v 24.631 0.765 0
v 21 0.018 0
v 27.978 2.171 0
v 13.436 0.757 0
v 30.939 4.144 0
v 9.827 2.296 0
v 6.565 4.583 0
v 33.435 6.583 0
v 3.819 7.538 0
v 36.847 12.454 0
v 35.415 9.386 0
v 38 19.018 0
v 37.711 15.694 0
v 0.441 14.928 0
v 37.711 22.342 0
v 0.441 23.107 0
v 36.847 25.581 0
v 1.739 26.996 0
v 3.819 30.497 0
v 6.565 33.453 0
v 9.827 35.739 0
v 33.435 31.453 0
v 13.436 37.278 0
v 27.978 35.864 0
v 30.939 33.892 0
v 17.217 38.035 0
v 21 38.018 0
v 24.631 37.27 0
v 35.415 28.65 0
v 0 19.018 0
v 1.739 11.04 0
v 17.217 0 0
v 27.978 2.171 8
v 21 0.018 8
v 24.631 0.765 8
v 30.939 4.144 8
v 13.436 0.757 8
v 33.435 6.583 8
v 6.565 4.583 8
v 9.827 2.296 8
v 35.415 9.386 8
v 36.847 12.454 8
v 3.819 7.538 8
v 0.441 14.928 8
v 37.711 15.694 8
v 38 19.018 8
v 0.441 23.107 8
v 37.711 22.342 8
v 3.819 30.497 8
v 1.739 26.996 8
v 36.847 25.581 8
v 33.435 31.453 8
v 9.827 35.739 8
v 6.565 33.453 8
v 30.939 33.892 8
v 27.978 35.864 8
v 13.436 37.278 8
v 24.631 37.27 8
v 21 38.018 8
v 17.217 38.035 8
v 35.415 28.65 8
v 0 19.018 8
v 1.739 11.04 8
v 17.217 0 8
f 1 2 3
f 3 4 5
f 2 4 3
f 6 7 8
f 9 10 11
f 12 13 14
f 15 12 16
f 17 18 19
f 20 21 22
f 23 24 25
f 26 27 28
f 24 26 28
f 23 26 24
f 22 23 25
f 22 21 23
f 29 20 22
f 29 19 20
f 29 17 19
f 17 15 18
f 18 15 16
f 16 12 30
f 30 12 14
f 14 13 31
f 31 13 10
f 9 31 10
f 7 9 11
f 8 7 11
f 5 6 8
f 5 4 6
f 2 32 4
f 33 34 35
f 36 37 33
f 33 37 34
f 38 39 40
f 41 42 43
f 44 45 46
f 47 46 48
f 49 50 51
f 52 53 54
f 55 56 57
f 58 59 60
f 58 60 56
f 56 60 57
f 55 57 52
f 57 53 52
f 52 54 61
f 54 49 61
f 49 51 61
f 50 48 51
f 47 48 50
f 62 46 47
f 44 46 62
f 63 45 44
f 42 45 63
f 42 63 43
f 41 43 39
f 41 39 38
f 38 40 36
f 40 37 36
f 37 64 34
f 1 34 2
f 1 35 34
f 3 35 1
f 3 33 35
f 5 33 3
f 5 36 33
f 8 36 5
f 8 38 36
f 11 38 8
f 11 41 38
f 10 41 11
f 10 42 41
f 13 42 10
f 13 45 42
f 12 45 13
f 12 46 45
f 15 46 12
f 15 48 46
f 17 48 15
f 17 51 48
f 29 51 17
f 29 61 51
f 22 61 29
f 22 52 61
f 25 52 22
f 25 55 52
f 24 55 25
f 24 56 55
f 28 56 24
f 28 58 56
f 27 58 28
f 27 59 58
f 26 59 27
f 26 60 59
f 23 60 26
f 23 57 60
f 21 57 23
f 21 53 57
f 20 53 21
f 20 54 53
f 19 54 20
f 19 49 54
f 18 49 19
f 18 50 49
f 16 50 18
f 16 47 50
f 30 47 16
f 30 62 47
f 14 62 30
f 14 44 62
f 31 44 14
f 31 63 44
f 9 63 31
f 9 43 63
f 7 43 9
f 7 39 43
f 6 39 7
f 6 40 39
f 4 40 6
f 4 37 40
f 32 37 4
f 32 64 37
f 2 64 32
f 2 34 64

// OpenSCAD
$fn = 32;

// ----------------------------------------------------------------------
// Cam disc: base radius 17.0 mm, lift 4.0 mm, 32 profile points
// ----------------------------------------------------------------------

// --- parameters (mm) ---
profile_height = 8;       // extrusion height
profile_points = 32;      // points of the closed outline

profile = [[38, 19.018], [37.711, 22.342], [36.847, 25.581], [35.415, 28.65], [33.435, 31.453], [30.939, 33.892], [27.978, 35.864], [24.631, 37.27], [21, 38.018], [17.217, 38.035], [13.436, 37.278], [9.827, 35.739], [6.565, 33.453], [3.819, 30.497], [1.739, 26.996], [0.441, 23.107], [0, 19.018], [0.441, 14.928], [1.739, 11.04], [3.819, 7.538], [6.565, 4.583], [9.827, 2.296], [13.436, 0.757], [17.217, 0], [21, 0.018], [24.631, 0.765], [27.978, 2.171], [30.939, 4.144], [33.435, 6.583], [35.415, 9.386], [36.847, 12.454], [37.711, 15.694]];  // single closed polygon, 32 points, counter clockwise

// --- the one profile operation ---
linear_extrude(height = profile_height) polygon(points = profile);
